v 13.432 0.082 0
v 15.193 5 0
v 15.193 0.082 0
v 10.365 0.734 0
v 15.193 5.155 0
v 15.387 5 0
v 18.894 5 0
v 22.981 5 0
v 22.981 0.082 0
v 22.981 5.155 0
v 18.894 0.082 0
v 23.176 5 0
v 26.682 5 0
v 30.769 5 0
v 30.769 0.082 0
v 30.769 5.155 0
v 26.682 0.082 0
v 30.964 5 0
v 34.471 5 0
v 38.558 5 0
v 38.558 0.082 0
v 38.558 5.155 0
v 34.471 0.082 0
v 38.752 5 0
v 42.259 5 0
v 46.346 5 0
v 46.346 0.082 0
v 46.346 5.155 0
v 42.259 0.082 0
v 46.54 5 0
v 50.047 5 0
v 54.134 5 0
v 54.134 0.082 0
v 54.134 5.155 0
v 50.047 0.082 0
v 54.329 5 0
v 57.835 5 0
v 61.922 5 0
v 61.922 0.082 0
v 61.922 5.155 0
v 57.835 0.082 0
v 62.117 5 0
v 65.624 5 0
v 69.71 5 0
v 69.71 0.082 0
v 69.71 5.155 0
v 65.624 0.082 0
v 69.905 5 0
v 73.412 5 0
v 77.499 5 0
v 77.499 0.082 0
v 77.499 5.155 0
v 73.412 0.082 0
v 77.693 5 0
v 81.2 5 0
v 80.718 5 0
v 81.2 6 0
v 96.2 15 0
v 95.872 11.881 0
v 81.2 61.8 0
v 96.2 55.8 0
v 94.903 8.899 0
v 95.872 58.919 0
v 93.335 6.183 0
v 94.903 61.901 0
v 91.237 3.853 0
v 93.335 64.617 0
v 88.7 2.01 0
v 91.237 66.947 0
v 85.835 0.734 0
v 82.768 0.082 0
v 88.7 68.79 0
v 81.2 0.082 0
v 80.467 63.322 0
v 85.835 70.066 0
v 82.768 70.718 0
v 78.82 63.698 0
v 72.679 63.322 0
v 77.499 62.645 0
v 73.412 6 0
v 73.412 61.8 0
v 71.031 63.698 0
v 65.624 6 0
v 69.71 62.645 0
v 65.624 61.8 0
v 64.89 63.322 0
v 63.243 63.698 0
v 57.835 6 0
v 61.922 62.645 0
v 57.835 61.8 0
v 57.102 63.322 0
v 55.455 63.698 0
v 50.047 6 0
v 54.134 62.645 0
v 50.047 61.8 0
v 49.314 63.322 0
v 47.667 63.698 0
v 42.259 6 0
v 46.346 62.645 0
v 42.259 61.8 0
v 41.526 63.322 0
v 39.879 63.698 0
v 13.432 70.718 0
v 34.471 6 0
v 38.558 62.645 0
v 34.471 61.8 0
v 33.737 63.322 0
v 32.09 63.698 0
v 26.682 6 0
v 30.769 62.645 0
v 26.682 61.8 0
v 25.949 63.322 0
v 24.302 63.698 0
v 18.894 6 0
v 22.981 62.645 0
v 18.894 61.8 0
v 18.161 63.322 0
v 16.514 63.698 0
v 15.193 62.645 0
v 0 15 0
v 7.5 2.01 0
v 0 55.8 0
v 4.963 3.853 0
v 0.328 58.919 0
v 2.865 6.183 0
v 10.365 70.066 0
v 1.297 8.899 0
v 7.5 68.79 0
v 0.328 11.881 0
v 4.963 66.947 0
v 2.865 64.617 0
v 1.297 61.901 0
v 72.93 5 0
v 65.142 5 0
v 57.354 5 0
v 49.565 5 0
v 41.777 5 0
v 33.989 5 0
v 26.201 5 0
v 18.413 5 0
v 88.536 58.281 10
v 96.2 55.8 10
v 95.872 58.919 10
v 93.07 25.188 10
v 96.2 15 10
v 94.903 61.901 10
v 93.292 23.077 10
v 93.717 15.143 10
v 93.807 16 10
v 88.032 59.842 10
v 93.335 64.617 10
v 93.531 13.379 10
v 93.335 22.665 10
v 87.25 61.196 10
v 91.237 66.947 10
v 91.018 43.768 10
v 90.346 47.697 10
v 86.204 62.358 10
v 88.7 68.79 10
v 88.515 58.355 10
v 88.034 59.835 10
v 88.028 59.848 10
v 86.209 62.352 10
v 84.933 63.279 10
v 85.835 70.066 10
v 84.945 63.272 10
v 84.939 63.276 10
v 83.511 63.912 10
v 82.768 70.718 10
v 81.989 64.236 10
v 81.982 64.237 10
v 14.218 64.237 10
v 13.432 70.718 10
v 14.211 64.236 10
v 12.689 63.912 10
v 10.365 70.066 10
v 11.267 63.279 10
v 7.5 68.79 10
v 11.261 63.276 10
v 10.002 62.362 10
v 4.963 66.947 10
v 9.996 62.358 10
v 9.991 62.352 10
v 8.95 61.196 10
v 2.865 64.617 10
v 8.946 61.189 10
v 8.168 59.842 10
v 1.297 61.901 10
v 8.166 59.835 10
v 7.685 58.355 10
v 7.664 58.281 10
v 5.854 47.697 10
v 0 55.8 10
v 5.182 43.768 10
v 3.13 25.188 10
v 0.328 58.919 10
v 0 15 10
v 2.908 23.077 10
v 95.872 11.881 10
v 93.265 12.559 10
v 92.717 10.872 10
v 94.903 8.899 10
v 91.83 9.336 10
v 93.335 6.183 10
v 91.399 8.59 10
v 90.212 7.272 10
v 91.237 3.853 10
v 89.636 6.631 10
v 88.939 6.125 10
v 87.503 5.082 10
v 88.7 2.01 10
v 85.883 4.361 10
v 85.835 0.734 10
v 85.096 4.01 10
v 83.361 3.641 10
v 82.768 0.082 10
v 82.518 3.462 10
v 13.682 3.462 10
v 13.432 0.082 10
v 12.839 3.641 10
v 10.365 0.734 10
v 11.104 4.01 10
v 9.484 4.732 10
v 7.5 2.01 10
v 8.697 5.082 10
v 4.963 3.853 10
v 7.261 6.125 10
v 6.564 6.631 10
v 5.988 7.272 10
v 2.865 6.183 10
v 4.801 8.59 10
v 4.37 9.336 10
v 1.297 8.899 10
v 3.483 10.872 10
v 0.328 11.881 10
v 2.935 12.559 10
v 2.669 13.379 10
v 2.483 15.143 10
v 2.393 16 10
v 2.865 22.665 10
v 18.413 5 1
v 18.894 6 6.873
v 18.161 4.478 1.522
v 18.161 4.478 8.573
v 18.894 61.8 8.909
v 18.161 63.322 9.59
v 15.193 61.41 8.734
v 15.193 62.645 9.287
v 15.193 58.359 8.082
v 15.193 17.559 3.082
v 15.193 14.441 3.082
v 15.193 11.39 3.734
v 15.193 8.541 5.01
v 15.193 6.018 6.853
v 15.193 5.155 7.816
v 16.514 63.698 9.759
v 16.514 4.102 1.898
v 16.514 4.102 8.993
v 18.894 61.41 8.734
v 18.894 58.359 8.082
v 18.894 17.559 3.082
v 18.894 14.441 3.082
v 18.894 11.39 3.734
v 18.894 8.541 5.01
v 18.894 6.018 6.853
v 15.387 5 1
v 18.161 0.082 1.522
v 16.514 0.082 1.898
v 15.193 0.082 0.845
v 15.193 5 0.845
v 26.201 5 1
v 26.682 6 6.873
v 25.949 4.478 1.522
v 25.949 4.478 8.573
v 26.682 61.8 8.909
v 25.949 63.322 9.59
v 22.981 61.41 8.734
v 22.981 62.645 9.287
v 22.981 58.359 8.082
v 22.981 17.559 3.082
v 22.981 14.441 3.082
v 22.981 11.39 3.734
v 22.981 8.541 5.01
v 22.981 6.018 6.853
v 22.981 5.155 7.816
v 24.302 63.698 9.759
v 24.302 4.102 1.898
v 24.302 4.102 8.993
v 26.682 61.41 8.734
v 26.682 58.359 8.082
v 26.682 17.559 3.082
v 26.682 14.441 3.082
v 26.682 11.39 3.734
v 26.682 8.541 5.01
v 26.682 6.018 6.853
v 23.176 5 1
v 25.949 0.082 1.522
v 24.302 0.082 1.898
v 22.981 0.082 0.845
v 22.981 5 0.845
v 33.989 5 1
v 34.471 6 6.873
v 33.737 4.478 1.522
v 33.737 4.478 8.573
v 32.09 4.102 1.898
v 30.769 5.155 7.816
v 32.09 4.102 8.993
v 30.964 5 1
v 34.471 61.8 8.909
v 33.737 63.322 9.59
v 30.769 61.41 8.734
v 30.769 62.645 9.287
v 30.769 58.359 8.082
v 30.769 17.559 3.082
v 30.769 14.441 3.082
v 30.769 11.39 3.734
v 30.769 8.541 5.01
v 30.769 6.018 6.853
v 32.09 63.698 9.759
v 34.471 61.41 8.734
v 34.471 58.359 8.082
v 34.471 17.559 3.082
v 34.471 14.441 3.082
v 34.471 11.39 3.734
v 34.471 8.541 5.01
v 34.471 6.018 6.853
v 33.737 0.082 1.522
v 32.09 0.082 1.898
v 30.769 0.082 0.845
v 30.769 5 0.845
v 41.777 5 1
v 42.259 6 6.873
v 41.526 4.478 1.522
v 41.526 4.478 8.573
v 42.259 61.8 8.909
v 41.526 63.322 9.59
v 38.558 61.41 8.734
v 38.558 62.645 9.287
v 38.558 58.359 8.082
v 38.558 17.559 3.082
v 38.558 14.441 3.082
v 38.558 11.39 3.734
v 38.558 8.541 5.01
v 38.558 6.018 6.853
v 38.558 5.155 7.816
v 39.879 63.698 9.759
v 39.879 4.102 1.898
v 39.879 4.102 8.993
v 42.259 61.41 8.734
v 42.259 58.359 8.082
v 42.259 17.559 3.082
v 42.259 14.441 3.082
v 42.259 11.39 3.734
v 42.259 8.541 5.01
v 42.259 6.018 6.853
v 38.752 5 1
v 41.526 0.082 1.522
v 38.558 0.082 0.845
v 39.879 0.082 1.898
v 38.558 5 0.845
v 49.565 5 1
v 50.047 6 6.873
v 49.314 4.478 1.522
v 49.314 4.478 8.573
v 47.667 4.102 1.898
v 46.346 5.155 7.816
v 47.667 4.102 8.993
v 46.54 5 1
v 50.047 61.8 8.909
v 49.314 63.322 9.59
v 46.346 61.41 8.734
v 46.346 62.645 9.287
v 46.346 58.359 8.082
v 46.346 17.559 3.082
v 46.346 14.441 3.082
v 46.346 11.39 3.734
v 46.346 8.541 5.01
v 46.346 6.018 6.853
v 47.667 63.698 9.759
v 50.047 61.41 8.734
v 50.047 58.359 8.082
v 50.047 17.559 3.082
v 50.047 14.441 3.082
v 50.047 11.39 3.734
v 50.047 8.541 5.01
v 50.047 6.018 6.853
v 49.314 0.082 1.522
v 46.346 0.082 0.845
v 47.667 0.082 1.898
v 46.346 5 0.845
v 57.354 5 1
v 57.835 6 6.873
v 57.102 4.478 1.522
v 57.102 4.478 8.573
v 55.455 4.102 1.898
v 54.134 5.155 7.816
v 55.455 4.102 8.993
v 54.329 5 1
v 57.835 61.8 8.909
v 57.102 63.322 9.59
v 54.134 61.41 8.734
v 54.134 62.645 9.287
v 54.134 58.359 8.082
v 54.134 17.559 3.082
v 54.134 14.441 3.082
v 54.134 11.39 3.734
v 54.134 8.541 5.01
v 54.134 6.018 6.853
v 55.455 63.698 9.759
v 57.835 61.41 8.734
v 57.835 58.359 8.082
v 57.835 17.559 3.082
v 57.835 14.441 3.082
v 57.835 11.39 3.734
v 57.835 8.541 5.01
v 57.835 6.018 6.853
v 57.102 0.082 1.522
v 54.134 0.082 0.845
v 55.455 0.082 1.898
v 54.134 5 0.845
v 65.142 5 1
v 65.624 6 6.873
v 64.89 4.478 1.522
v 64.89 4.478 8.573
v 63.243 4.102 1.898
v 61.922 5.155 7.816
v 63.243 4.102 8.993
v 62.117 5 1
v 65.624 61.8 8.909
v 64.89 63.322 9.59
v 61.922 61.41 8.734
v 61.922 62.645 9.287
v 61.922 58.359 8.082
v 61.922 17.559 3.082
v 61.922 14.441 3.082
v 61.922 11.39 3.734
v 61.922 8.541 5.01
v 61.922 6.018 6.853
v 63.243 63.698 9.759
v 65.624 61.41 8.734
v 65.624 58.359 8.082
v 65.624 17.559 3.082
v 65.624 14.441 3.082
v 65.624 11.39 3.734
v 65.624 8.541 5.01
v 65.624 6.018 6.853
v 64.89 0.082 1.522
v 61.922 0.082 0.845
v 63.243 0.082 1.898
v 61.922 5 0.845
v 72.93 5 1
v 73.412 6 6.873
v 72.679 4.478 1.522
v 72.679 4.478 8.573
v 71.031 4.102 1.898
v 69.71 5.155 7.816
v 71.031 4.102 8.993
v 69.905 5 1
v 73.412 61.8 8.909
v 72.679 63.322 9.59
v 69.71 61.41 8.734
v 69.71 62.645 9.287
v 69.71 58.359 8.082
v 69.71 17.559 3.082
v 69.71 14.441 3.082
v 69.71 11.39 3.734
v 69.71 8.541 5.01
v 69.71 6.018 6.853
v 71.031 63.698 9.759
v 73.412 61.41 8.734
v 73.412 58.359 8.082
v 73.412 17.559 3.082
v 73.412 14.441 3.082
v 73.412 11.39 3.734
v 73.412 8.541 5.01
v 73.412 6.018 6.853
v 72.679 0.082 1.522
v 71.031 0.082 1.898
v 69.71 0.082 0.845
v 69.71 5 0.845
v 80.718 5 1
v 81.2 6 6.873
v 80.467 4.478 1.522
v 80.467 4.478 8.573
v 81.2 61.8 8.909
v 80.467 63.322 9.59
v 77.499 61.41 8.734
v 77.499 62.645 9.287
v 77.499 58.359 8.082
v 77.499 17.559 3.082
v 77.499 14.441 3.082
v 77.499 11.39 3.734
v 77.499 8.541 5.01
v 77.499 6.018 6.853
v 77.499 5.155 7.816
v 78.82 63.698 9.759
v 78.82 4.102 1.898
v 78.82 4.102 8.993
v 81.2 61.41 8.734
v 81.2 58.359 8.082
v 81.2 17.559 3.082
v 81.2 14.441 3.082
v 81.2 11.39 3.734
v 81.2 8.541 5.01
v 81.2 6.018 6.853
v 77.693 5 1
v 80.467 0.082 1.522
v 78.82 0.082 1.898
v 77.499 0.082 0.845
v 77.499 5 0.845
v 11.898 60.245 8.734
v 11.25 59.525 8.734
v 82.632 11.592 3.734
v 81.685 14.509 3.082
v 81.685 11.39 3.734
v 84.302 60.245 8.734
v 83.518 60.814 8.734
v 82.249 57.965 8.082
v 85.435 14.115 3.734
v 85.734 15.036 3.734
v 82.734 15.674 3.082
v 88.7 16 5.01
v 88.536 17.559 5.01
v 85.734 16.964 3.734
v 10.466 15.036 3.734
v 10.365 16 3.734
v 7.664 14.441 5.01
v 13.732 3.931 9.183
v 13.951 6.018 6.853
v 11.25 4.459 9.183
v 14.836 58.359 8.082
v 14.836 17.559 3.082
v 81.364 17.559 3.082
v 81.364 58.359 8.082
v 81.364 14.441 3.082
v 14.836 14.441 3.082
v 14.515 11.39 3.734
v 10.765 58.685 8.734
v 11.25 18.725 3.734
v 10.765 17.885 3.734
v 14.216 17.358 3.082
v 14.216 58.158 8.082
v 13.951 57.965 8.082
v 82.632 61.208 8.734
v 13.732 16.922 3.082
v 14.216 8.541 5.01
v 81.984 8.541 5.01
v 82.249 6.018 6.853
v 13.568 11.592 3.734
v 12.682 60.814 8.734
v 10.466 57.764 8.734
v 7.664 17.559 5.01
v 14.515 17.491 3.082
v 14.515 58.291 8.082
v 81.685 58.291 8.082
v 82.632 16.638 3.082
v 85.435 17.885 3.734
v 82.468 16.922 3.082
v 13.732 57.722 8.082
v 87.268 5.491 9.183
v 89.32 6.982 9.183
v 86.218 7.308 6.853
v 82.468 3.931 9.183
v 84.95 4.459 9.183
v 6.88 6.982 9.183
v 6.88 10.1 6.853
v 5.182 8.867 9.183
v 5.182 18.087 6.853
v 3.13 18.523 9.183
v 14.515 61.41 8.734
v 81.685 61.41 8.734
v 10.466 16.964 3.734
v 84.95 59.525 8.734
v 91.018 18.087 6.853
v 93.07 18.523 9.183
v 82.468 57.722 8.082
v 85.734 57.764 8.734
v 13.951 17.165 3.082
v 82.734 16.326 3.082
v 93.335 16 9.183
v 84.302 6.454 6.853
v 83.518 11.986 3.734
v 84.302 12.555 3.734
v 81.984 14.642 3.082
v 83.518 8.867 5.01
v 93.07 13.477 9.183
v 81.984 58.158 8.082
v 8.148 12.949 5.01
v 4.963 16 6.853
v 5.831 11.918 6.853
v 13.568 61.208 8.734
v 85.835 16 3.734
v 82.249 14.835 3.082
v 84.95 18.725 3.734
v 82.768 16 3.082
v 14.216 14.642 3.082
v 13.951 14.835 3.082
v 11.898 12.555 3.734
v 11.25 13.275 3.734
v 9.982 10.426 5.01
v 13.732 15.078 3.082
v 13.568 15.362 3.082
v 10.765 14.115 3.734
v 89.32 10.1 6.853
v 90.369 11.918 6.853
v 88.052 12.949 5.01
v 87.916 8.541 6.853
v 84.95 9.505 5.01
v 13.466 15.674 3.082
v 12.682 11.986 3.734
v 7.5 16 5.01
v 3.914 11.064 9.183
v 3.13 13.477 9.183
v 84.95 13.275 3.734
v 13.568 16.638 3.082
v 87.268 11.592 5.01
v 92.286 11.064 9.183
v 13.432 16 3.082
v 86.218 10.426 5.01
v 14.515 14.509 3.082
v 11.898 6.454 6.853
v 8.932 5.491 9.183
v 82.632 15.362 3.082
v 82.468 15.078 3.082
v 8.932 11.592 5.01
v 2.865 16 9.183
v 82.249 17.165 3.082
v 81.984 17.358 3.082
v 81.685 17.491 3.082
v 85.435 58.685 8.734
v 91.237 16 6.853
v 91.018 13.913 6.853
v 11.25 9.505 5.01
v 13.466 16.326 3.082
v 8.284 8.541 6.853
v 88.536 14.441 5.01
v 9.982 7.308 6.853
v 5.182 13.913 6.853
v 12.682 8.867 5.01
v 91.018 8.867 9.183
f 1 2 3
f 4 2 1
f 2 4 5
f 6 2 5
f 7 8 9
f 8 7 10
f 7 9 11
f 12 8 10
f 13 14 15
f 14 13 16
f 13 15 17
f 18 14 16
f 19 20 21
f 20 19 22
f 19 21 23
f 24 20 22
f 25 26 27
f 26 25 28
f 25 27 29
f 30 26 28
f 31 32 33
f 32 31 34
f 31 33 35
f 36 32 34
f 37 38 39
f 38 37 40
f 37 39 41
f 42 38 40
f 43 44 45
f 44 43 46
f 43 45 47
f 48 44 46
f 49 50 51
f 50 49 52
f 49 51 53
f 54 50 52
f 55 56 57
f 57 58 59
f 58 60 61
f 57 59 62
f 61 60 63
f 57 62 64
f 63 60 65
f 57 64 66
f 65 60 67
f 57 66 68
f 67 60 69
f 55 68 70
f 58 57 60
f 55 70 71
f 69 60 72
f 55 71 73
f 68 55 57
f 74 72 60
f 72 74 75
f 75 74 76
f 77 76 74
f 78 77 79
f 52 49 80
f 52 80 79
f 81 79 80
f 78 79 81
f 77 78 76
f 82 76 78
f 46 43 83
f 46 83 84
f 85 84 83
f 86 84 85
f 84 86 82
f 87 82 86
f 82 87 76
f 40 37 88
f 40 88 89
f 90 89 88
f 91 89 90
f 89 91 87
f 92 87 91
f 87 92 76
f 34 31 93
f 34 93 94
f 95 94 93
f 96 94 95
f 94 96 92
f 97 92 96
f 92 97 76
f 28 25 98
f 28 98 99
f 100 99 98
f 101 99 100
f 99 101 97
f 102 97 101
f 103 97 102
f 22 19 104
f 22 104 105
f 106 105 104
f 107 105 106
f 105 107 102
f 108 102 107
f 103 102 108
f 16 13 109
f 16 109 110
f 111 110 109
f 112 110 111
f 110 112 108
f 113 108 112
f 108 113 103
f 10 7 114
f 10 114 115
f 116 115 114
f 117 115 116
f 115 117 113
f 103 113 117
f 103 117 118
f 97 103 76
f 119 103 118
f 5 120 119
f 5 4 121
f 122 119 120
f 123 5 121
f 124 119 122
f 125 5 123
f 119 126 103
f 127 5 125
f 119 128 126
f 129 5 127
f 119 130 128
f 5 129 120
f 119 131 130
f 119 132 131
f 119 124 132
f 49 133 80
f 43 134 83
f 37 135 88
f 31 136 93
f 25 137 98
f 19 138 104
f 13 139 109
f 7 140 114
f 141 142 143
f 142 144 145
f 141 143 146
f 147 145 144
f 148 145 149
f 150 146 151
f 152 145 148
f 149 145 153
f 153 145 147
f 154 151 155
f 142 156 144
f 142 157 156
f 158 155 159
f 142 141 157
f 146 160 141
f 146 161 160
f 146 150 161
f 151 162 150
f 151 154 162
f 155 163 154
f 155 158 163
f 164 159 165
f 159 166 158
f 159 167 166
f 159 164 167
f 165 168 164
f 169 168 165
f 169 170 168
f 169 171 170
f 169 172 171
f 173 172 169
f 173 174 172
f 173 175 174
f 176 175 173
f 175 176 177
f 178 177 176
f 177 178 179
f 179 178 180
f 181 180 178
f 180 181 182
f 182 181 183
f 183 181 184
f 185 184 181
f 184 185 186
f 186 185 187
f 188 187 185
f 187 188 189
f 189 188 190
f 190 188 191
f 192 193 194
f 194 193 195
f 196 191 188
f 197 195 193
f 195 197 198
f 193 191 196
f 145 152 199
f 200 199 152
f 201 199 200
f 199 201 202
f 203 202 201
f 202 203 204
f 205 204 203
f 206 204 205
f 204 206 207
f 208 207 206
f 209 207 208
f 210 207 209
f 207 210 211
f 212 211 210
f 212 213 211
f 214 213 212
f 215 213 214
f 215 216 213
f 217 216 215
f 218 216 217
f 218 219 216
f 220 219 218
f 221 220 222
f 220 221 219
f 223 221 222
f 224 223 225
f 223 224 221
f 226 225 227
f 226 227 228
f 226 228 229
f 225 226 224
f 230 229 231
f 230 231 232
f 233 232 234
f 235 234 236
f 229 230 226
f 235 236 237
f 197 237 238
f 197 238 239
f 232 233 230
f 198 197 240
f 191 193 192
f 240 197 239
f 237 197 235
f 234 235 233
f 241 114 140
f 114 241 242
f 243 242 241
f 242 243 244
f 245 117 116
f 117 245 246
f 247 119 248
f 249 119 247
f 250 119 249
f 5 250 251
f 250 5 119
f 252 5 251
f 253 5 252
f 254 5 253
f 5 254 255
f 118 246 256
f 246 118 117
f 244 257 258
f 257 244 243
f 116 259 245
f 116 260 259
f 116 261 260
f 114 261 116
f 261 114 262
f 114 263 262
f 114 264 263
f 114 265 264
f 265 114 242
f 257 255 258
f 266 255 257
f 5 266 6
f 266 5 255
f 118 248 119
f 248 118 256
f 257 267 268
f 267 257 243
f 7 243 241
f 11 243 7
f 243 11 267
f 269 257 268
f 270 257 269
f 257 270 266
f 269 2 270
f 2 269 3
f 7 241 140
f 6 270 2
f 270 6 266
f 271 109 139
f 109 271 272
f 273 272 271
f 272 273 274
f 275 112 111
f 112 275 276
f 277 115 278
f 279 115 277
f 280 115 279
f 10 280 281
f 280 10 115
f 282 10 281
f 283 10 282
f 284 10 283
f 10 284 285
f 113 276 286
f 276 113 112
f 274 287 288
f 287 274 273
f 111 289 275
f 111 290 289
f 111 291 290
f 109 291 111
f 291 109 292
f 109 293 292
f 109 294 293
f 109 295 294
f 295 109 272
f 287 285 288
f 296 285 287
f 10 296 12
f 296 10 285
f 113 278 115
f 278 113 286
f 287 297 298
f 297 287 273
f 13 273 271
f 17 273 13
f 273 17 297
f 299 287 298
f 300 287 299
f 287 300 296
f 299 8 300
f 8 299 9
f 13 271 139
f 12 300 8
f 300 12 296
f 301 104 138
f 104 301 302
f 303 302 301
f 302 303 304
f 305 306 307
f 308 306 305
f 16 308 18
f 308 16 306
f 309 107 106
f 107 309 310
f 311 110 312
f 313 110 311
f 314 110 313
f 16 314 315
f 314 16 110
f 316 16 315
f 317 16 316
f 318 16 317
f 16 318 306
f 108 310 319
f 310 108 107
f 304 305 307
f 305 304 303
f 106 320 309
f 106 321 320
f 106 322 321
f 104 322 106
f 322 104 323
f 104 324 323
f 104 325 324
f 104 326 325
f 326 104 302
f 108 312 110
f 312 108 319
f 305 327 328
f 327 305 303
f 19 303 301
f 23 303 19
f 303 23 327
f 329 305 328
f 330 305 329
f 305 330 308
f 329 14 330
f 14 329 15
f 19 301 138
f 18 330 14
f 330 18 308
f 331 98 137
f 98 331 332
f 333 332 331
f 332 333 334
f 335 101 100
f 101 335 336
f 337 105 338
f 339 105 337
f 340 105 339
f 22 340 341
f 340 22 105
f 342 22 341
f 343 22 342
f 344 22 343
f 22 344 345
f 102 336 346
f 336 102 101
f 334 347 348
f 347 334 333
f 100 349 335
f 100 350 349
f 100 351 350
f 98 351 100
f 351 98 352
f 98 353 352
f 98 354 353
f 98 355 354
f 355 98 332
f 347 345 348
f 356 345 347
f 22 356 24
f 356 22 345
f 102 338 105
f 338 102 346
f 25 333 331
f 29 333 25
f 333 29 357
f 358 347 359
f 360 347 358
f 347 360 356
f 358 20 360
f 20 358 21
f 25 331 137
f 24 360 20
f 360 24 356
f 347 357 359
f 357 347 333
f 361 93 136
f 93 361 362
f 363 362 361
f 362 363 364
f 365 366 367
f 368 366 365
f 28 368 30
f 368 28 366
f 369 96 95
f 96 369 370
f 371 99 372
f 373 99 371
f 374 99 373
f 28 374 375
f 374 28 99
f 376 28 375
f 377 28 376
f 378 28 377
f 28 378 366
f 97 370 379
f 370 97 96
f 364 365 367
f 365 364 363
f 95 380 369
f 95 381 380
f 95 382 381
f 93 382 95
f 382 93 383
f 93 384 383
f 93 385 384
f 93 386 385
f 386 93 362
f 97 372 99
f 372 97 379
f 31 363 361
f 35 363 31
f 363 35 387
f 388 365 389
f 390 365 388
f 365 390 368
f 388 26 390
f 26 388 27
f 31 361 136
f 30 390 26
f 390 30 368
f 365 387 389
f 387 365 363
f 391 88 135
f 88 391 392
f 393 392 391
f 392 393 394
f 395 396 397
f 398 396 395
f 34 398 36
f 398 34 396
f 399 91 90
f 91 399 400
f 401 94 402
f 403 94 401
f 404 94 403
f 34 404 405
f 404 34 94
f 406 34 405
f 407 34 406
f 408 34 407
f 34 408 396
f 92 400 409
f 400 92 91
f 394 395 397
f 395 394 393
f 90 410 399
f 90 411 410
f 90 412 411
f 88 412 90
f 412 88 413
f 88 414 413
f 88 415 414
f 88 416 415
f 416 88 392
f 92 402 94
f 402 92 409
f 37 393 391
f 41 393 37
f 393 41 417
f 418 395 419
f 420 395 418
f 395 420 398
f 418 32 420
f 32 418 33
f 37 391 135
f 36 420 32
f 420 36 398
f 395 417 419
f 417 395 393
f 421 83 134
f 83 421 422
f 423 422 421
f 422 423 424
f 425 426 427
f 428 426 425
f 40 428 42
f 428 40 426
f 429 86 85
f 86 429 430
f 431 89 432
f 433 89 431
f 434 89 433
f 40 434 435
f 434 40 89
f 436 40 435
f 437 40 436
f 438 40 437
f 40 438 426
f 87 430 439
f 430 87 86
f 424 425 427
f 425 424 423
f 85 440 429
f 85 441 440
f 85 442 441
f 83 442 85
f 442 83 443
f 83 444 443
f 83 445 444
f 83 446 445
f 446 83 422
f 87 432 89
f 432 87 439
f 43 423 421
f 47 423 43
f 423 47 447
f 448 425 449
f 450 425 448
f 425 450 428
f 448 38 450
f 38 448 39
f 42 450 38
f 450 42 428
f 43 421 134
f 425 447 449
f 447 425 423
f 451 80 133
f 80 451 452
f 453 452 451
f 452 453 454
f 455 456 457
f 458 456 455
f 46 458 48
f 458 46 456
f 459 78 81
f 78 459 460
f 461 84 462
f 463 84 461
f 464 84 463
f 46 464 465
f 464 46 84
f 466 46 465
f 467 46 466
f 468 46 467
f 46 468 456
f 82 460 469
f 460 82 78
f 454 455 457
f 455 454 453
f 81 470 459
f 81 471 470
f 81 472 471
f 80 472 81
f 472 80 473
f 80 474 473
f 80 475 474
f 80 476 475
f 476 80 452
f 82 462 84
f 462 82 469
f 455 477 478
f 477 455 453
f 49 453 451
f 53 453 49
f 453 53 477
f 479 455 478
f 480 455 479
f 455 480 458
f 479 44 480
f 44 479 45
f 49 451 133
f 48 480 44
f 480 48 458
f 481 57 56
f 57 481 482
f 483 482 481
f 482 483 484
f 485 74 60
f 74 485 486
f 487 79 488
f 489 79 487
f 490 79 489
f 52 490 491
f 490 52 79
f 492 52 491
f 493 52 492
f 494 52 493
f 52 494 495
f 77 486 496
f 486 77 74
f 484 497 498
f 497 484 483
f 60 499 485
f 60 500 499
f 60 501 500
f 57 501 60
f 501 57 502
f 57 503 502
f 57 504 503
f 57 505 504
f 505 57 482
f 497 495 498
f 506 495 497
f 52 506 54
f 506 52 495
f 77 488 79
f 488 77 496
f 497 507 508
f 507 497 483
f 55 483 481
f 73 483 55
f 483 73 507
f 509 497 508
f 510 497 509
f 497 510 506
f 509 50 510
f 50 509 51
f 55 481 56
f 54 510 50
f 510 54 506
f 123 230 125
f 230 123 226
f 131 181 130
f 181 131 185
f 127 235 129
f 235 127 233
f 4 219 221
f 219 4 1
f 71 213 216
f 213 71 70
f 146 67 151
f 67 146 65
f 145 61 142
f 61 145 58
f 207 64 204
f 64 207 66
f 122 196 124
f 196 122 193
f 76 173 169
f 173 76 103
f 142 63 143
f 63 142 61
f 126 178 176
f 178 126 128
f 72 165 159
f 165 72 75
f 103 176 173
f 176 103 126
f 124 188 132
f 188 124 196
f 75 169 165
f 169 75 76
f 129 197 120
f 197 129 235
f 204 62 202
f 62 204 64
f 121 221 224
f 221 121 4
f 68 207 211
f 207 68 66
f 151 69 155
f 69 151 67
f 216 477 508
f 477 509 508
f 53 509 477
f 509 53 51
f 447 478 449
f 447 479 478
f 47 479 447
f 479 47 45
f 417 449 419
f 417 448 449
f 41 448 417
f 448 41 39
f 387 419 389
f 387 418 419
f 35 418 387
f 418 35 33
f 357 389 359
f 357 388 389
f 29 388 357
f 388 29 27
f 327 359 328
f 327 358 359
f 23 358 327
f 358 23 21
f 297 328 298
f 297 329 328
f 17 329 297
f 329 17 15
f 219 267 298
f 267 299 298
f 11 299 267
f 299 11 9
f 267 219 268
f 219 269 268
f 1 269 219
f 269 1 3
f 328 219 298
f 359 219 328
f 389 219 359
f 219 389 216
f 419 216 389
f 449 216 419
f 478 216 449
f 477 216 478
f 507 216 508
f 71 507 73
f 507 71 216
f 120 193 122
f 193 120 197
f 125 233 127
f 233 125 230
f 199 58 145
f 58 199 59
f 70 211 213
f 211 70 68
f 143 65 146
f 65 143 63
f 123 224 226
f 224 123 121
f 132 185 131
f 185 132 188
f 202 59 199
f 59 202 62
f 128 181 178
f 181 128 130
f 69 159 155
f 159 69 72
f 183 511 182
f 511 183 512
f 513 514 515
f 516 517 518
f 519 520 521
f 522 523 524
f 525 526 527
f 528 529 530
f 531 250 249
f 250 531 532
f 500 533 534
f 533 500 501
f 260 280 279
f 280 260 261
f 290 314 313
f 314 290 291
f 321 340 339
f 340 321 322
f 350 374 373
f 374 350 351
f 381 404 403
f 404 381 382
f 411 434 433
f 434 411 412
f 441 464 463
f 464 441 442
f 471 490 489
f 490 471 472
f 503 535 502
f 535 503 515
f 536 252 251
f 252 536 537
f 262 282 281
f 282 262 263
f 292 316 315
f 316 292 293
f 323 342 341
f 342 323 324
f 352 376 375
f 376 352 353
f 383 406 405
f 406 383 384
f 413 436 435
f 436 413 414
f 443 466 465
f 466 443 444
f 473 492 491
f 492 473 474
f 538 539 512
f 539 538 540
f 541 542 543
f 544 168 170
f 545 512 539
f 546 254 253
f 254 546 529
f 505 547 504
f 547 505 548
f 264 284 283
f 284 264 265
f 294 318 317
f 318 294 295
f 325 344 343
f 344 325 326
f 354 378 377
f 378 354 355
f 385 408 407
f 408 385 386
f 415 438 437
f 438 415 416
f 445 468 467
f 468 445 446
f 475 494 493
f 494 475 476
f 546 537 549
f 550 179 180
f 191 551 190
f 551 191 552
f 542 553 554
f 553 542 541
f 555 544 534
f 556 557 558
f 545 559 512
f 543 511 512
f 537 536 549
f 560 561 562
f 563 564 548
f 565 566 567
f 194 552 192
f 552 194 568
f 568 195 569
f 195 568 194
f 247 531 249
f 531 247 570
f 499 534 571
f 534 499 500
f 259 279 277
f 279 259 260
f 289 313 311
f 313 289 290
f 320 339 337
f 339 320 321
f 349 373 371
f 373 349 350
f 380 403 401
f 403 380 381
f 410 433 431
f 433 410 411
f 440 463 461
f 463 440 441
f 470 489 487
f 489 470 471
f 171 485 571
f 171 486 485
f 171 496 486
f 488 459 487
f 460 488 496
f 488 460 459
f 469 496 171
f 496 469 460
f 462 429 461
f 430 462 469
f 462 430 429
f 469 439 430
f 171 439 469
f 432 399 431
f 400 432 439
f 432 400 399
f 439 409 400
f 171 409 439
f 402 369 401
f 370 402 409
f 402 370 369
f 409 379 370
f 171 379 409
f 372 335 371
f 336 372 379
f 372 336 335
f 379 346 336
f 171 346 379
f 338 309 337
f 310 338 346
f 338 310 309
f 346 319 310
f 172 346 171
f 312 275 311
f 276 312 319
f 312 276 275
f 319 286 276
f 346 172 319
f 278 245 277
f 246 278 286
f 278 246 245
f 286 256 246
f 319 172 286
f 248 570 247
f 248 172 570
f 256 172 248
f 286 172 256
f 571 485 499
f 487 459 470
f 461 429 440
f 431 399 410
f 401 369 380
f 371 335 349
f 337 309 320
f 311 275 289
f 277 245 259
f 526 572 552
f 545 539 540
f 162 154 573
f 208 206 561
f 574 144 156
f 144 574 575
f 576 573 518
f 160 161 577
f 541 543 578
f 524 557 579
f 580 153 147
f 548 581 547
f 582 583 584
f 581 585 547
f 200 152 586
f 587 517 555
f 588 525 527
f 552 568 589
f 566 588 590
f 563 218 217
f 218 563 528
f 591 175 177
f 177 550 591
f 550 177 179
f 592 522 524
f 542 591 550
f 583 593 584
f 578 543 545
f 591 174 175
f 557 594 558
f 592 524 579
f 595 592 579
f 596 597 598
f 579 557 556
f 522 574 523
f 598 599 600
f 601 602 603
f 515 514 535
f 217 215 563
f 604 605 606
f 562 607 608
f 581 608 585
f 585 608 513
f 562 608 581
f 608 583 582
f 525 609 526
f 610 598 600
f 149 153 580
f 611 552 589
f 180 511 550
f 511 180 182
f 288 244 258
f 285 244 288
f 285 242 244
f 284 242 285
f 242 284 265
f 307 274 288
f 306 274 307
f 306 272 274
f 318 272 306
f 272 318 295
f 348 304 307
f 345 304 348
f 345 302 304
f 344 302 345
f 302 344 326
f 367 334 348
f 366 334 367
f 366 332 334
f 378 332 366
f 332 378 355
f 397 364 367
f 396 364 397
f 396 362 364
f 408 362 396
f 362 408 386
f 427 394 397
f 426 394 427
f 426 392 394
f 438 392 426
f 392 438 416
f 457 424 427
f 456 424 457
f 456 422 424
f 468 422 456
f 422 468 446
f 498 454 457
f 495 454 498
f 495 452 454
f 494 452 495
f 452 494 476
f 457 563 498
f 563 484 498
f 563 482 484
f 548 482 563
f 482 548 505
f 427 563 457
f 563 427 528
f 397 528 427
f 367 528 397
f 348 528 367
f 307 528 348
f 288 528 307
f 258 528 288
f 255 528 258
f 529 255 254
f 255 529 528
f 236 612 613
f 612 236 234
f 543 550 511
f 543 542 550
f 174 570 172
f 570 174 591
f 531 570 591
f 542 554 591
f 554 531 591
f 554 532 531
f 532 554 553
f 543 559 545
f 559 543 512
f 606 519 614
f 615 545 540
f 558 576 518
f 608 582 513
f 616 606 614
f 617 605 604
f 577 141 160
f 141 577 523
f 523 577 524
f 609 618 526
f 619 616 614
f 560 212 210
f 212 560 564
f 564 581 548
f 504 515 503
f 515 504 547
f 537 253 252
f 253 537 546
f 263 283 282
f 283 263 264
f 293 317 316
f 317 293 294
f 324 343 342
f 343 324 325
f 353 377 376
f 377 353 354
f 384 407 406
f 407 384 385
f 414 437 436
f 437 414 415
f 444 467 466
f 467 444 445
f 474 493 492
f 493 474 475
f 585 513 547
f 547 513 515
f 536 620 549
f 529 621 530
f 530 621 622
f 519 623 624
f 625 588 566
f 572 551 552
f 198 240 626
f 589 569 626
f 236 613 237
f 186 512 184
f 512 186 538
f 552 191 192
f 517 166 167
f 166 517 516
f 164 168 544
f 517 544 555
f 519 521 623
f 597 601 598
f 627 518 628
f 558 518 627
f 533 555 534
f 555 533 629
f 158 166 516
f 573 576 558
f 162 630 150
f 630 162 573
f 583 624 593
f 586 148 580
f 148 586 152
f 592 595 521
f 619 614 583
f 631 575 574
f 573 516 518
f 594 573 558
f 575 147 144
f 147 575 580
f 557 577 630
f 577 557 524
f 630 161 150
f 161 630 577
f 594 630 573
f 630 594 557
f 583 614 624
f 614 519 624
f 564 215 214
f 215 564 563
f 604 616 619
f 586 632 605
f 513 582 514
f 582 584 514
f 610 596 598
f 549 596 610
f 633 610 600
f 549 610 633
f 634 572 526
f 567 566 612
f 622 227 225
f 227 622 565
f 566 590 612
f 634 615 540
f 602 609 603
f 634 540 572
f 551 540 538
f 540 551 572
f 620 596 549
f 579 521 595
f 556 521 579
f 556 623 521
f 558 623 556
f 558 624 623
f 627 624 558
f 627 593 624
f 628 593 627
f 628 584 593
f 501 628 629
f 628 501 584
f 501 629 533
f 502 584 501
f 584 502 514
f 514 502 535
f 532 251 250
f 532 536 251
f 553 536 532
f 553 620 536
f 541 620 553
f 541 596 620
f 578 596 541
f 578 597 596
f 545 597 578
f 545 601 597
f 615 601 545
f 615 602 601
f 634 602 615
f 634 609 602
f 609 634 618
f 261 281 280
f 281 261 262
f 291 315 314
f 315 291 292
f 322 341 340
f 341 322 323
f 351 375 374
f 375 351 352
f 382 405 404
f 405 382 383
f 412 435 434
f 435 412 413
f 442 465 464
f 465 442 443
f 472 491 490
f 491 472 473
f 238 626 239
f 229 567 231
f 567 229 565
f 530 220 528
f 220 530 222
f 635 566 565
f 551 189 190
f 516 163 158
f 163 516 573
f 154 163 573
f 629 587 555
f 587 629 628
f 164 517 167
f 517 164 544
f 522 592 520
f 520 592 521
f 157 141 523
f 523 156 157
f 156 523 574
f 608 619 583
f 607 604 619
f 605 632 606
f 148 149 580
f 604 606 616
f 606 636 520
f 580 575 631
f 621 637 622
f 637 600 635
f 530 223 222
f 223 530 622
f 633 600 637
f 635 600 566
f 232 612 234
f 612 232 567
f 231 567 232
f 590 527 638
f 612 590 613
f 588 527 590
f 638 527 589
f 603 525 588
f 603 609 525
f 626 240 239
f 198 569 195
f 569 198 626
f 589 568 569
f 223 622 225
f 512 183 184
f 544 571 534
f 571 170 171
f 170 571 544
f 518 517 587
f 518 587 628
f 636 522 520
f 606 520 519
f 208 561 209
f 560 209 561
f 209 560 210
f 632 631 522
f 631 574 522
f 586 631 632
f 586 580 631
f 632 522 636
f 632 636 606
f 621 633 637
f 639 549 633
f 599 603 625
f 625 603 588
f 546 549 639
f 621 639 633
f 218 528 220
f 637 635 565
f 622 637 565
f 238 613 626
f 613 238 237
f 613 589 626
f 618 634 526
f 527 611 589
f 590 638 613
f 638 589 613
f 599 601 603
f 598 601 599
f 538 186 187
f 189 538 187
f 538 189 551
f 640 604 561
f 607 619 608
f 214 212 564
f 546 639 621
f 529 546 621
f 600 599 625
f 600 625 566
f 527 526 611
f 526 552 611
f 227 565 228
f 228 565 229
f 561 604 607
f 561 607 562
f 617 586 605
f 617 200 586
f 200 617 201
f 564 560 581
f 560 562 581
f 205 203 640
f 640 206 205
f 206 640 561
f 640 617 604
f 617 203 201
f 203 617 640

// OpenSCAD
TRAY_W_mm=20+(3*2.54*10);
TRAY_H_mm=10;
TRAY_D_mm=20+(2*2.54*10);
EDGE_RAD_mm=15;
density=17;

module SoapPuckTray()
{
	TRAY(key=true, keyhole=true);
}

module tray_base(w_mm, h_mm, d_mm, rad_mm)
{
	hull()
	{
		translate([rad_mm, rad_mm, 0]) cylinder(h_mm, rad_mm, rad_mm);
		translate([w_mm-rad_mm, 0+rad_mm, 0]) cylinder(h_mm, rad_mm, rad_mm);
		translate([w_mm-rad_mm, d_mm-rad_mm, 0]) cylinder(h_mm, rad_mm, rad_mm);
		translate([0+rad_mm, d_mm-rad_mm, 0]) cylinder(h_mm, rad_mm, rad_mm);
	}
}

module tray_comb(edge_mm, x_mm, y_mm, z_mm, count)
{
	assert(count%2, "Must be an odd number.");
	gap_w=(x_mm/count);
	for (i = [1:2:count])
	{
		tooth_x=(edge_mm/2)+((i-1)*gap_w);
		translate([tooth_x, edge_mm/3 + 1, 0]) combgap(y_mm-edge_mm, z_mm, gap_w);
		//translate([tooth_x, 0, 0]) cube([gap_w, y_mm-edge_mm, z_mm/2]);
		translate([tooth_x+(gap_w/2), edge_mm/3, 0]) rotate([90,0,0]) cylinder(y_mm-edge_mm, gap_w/2, gap_w/2);
	}
}

module combgap(y_mm, z_mm, rad_mm)
{
	hull()
	{
		translate([rad_mm/2, 0, 0]) cylinder(z_mm, rad_mm/2, rad_mm/2, center=false);
		translate([rad_mm/2, y_mm, 0]) cylinder(z_mm, rad_mm/2, rad_mm/2, center=false);
	}
}

module bar_negation(x_mm, y_mm, z_mm, rad_mm)
{
	hull()
	{
		translate([rad_mm, rad_mm, z_mm+rad_mm]) sphere(rad_mm);
		translate([x_mm-rad_mm, 0+rad_mm, z_mm+rad_mm]) sphere(rad_mm);
		translate([x_mm-rad_mm, y_mm-rad_mm, z_mm+rad_mm+5]) sphere(rad_mm);
		translate([rad_mm, y_mm-rad_mm, z_mm+rad_mm+5]) sphere(rad_mm);
	}
}

module keyjoint()
{
	cube([6,3,3]);
	translate([3,-1.5,0]) cube([3,6,6]);
}

module keyjoint_pair(separation_mm)
{
	keyjoint();
	translate([0, separation_mm, 0]) keyjoint();
}



module TRAY(key=false, keyhole=false)
{
	rad=EDGE_RAD_mm;
	comb_x=TRAY_W_mm-2*rad;
	comb_y=TRAY_D_mm;
	comb_z=TRAY_H_mm;

	difference()
	{
		tray_base(TRAY_W_mm, TRAY_H_mm, TRAY_D_mm, EDGE_RAD_mm);
		translate([rad/2,0,0]) tray_comb(rad, comb_x, comb_y, comb_z, density);
		translate([0,1,0-7]) bar_negation(TRAY_W_mm, TRAY_D_mm, TRAY_H_mm, rad);
		if(keyhole)
		{
		translate([0-1, TRAY_D_mm/3, 0]) scale([1.1, 1.1, 1.1]) keyjoint();
		translate([0-1, TRAY_D_mm*(2/3), 0]) scale([1.1, 1.1, 1.1]) keyjoint();
		}
	}
	if(key)
	{
		translate([TRAY_W_mm, TRAY_D_mm*(1/3), 0]) keyjoint_pair(2.54*10);
	}
};



//$fn = 90;

TRAY();
